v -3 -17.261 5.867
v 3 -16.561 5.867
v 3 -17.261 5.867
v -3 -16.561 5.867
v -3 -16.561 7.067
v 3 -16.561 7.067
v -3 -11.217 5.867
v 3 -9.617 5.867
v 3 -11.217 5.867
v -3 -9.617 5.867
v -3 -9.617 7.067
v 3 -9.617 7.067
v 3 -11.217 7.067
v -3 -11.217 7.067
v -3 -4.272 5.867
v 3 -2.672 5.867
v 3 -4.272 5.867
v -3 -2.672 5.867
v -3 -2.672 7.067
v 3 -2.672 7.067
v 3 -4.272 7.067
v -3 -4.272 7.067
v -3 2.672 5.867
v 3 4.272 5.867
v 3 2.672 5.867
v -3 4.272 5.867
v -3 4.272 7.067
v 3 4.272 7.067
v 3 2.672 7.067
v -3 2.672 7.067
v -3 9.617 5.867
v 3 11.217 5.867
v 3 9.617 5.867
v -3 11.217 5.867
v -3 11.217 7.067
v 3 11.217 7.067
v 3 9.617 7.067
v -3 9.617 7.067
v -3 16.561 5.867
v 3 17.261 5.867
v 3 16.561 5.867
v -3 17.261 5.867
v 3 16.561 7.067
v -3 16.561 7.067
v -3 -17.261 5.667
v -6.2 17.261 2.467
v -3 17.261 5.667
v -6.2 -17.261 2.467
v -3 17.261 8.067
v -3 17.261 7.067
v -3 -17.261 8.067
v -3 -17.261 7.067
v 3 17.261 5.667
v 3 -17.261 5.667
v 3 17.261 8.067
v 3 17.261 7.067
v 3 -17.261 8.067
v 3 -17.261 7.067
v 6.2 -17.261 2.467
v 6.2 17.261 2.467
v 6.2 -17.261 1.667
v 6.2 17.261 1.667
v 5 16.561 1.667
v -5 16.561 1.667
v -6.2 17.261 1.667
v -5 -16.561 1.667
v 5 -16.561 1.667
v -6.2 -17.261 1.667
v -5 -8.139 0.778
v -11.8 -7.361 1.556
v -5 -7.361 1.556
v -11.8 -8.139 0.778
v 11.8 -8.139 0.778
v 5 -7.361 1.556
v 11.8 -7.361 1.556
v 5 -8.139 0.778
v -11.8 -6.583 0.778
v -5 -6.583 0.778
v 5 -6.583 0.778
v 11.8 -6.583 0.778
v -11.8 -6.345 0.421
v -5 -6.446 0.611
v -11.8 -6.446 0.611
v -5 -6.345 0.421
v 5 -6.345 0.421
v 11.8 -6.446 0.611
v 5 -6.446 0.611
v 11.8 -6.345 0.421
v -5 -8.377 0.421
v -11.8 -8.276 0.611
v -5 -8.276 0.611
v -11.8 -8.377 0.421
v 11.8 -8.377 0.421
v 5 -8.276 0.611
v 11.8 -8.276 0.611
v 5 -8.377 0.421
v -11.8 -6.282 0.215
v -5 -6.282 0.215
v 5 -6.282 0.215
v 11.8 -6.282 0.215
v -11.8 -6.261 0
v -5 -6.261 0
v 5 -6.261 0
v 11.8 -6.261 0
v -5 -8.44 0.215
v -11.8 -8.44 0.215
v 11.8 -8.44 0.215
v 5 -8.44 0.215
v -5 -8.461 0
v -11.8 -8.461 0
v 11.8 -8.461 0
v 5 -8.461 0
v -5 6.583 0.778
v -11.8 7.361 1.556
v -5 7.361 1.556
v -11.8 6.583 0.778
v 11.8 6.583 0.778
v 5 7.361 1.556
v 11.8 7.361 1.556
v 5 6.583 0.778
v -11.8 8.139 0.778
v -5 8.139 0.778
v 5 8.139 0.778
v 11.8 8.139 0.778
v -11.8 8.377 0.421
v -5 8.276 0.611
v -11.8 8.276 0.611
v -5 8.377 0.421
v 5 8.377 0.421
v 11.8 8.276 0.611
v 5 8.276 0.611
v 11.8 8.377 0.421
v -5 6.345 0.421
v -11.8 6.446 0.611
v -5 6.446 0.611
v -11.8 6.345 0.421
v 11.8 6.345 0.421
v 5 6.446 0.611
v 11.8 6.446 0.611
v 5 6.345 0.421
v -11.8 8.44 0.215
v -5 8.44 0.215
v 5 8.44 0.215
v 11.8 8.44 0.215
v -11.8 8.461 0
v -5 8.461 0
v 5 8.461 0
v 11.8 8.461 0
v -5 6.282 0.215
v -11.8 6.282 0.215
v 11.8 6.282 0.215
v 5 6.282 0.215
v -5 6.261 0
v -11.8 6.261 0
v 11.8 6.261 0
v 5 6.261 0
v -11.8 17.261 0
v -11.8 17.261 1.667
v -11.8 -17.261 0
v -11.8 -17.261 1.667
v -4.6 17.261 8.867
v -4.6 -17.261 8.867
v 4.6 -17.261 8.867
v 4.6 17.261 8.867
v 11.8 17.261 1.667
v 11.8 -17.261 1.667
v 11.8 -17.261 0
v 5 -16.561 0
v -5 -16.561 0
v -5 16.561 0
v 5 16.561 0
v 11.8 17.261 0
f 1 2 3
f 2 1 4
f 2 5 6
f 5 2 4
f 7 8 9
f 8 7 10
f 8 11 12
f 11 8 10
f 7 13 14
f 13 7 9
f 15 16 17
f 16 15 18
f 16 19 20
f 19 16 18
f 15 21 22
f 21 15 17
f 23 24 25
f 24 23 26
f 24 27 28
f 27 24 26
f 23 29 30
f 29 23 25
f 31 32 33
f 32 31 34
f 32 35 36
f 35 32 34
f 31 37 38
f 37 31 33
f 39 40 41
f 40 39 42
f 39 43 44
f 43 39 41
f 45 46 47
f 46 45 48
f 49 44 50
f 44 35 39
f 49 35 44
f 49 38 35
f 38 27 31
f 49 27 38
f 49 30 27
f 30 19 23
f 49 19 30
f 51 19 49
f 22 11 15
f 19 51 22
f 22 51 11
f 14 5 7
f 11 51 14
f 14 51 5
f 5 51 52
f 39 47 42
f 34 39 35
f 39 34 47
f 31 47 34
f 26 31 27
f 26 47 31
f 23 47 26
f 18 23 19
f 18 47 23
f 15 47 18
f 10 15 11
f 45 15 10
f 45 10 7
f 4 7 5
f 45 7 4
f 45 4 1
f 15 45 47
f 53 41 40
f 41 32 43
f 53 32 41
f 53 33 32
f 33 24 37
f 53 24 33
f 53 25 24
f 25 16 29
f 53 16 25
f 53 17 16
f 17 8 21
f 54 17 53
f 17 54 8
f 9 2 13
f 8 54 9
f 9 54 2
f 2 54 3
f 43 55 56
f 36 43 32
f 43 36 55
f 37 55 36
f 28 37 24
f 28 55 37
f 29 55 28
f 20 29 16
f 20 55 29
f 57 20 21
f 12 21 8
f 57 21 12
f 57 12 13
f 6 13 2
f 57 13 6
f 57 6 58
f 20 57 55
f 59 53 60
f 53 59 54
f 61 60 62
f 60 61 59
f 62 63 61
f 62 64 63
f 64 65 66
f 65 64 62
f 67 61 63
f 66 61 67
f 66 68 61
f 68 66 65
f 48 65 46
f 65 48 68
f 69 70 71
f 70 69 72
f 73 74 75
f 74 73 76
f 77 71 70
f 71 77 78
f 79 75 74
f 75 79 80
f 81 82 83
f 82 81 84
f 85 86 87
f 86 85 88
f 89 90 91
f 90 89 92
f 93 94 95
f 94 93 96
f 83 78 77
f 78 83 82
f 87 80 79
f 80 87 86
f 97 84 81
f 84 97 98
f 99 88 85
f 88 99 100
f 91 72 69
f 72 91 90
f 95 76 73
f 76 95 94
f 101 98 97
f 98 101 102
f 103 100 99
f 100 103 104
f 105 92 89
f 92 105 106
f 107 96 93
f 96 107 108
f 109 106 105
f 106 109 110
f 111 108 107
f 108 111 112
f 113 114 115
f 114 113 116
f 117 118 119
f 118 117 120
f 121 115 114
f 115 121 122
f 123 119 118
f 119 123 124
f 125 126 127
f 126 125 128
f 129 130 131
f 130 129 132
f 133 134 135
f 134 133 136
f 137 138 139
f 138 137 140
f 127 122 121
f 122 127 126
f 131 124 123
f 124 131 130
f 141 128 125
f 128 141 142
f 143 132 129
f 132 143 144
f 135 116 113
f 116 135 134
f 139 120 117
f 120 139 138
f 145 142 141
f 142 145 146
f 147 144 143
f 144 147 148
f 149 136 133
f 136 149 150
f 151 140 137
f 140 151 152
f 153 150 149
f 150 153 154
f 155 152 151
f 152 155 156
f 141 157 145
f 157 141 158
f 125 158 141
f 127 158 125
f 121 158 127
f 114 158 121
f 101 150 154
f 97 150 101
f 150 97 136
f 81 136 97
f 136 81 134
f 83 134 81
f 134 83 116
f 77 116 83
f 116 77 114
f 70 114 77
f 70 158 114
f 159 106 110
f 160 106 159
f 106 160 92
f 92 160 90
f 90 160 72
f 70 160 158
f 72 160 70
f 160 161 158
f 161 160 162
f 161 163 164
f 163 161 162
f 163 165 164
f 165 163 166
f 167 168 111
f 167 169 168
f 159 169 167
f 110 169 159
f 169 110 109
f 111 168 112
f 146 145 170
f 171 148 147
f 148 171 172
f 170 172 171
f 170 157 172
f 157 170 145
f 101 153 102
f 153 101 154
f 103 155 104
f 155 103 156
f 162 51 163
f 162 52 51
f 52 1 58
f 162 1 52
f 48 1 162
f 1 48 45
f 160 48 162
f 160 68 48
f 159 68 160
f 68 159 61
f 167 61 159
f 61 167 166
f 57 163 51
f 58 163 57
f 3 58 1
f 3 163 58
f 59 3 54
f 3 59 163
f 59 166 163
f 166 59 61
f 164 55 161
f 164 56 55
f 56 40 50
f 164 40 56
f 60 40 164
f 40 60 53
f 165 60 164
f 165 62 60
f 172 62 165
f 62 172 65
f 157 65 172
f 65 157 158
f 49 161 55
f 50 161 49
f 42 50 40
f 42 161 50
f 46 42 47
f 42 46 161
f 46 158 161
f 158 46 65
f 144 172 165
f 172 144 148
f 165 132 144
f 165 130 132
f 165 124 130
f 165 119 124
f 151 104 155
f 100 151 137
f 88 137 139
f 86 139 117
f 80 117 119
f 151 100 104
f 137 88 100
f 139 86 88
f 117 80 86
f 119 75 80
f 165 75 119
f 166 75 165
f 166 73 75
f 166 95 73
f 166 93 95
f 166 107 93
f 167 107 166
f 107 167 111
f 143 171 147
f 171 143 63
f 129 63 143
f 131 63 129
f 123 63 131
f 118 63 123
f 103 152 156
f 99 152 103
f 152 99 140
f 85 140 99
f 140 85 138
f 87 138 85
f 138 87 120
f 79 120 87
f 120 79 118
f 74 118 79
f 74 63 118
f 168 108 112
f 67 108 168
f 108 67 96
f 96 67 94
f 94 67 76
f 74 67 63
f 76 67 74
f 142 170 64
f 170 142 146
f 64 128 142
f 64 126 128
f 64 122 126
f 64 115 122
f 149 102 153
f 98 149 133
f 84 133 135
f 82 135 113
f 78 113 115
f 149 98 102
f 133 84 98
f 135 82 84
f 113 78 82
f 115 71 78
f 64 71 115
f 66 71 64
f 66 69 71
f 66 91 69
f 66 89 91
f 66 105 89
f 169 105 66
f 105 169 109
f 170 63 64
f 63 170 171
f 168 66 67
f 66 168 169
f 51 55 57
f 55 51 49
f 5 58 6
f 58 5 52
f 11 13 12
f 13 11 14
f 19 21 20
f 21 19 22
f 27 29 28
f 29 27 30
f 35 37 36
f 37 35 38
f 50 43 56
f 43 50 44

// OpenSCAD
/*[Main]*/
part="test_channel";//[test_channel:test channel,test_joiner:test joiner,cap:cap,mount:mount,info:info,channel:channel,joiner_mid:joiner mid,joiner_end:joiner end,joiner_corner:corner,joiner_spur:spur]
//asembly tolerance
channel_tol=0.2;//[0:0.05:1]
//extrusion width
ew=0.4;//[0:0.01:1.5]

/*[Strip Properties]*/
//half of max width of strips to be used.
max_half_strip_w=6;//[1.5:0.1:12.5]
//thickness of strip including the parts on its surface and add little more for slack.
strip_t=3.4;//[1:0.1:10]
//width of strip
strip_w=12;//[3:0.1:25]
//thickness of just the pcb of the strip (excludes the parts on top). make larger than pcb thickness if theres unused double stick on back.
pcb_t=0.8;//[0.2:0.2:2]
//number of leds per meter. usually 144, 60, or 30
leds_per_m=144;//[20:1:250]

/*[Design Dimensions]*/
//LEDs per channel. should be some multiple of LEDs in your strip.
leds_per_seg=36;//[2:1:250]
//shortens one end of channel and joiner by some leds. effects: channel, joiner mid, joiner end
short=0;//[0:1:25]
//size for locking pin holes
pin_hole=2.2;//[1:0.01:3]
//estimate of joiner thickness. larger is stronger but heavier.
outer_sleve_t=2;//[1:0.2:6]

/*[Mount]*/
//Thickness
bracket_t=2;//[1:0.1:3]
//Width
bracket_w=20;//[10:1:50]
//Diameter of screw head
screw_head_d=6.5;//[1:0.1:15]
//Depth of countersink
screw_head_h=1.5;//[0.5:0.1:5]
//Screw hole diameter
screw_hole_d=3;//[1:0.1:5]
//clipping strength
mount_clip=1;//[0.4:0.1:1.6]
//pan/countersink
screw_head_shp=0;//[0:countersink,1:pan]

/*[Corners and Spurs]*/
//angle for corner
corner_angle=90;//[0:180]
//spur max sides
spur_sides_max=4;//[3:1:8]
//consecutive spur sides used
spur_sides=3;//[3:1:8]

/*[Wiring]*/
//diameter of power wires
power_d=2;//[1:0.2:5.6]
//diameter of signal wire
sig_d=2;//[0.4:0.2:3]
//wire spacing
wire_space=3;//[1:0.1:5]

/*[Diffusion Properties]*/
//diffusion distance
dist=3;//[1:0.2:15]
//diffusion thickness
diff_t=0.8;//[0.6:0.2:2]
//gap between top of baffle and diffuser to let a little out. smooths the look
baffle_bleed=1;//[0:0.2:15.2]

/*[Hidden]*/
//controlls how many sides the arcs of corners etc. have
a_step=360/36;
//some calculations...
//keeps LEDs aligned
channel_gap=channel_tol;
//makes top bridging easier
top_expand=ew*4;
//thickness of baffles. should be 4x extrusion width
baffle_t=4*ew;
//thickness of the bottom of the channel
bottom=pin_hole/1.5+0.2;
//in case you goofed. should be an integer result

//LED spacing
mm_per_led=1000/leds_per_m;
//length of channel
seg_len=leds_per_seg*mm_per_led;

joiner_ow=2*(strip_t+dist+diff_t)+max_half_strip_w+2*top_expand+(outer_sleve_t)*3;

channel_w=2*(strip_t+dist+diff_t)+max_half_strip_w+2*top_expand;

joinner_iw=channel_w+channel_tol;

joiner_oh=bottom+strip_t+dist+diff_t+(outer_sleve_t)*1.5;
//length to cut pin hole in joiners
joiner_pin_l=joiner_ow+2;
//length to cut pin hole in channels. actually more like a notch.
channel_pin_l=2*(strip_t+dist+diff_t)+max_half_strip_w+2*top_expand+2;
//because of multiple wires at a certain spacing. make equal to strip_w in case strip hangs out.
wire_hole_l=strip_w;
//length for test
leds_per_test=5;
test_len=mm_per_led*leds_per_test;
//pin holes space
pin_hole_space=20;
//maximum shorten
max_short=floor(leds_per_seg/2-pin_hole_space*3/mm_per_led);
short_final=min(short,max_short);
//parts:


if(part=="info")info();
if(part=="channel")translate([0,-seg_len/2,0])channel();
if(part=="test_channel")translate([0,-test_len/2,0])test_channel();
if(part=="test_joiner")translate([0,-test_len/2,0])translate([0,test_len/2,outer_sleve_t+channel_tol+pcb_t/2+power_d-pin_hole/2])test_joiner();
if(part=="cap")translate([0,0,outer_sleve_t+channel_tol+pcb_t/2+power_d])cap_w_hole();
if(part=="joiner_mid")translate([0,0,outer_sleve_t+channel_tol+pcb_t/2+power_d])joiner_mid();
if(part=="joiner_end")translate([0,-seg_len/4-mm_per_led,outer_sleve_t+channel_tol+pcb_t/2+power_d])joiner_end();
if(part=="joiner_corner")translate([mm_per_led/2-joiner_ow/2,mm_per_led/2-joiner_ow/2,outer_sleve_t+channel_tol+pcb_t/2+power_d-pin_hole/2])joiner_corner();
if(part=="joiner_spur")translate([0,0,outer_sleve_t+channel_tol+pcb_t/2+power_d-pin_hole/2])joiner_spur();
if(part=="mount")mount();

module mount_hole(l)
{
    /*hull()
    {
        translate([-(joiner_ow+channel_tol)/2,-l/2,-channel_tol])cube([joiner_ow+channel_tol,l,outer_sleve_t+bottom+channel_tol*5+power_d]);
        translate([-(joiner_ow+channel_tol)/6,-l/2,-channel_tol/2])cube([(joiner_ow+channel_tol)/3,l,(outer_sleve_t+bottom+channel_tol*5+power_d)+(joiner_ow+channel_tol)/3]);
    }*/
    union()
    {
        translate([0,-l/2,joiner_oh/2-channel_tol/2+(strip_t+dist)/2])rotate([-90,0,0])channel_hole(l,0,channel_tol+outer_sleve_t);
        translate([-joiner_ow/2-channel_tol*1.5,-l/2,joiner_oh/2-channel_tol*2-outer_sleve_t-channel_tol-pcb_t/2-power_d])cube([joiner_ow+channel_tol*3,l,power_d+1]);
    }
}
module mount()
{
    difference()
    {
        minkowski()
        {
            union()
            {
                mount_hole(bracket_w-bracket_t*2);
                translate([-(channel_tol*3+joiner_ow)/2,-(bracket_w-bracket_t*2)/2,-channel_tol-bracket_t/2])cube([channel_tol*3+joiner_ow,bracket_w-bracket_t*2,outer_sleve_t+channel_tol*2]);
            }
            sphere(r=bracket_t,$fn=6);           
        }
        mount_hole(bracket_w*2);
        translate([-(joiner_ow+bracket_t*2+channel_tol*4)/2,-(bracket_w+2)/2,(outer_sleve_t+bottom+channel_tol*5+power_d)+mount_clip])cube([joiner_ow+bracket_t*2+channel_tol*4,bracket_w+2,joiner_oh]);
            //screw hole
        translate([0,0,bracket_t/2])rotate([180,0,0]){
            cylinder(d1=screw_head_d,d2=screw_head_shp?screw_head_d:screw_hole_d,h=screw_head_h,$fn=30);
            cylinder(d=screw_hole_d,h=2.5*bracket_t,$fn=30);
        }
            //slots
            translate([joiner_ow/3,0,bracket_t/2])rotate([0,45,0])cube([(channel_tol+2*bracket_t-1)*sqrt(2),bracket_w+2,(channel_tol+2*bracket_t-1)*sqrt(2)],center=true);
            translate([-joiner_ow/3,0,bracket_t/2])rotate([0,45,0])cube([(channel_tol+2*bracket_t-1)*sqrt(2),bracket_w+2,(channel_tol+2*bracket_t-1)*sqrt(2)],center=true);
    }
}

module info()
{
    linear_extrude(1)text(str("Total width ",joiner_ow,"mm"));
    translate([0,-10,0])text(str("Normal segment length ",seg_len,"mm"));
    translate([0,-20,0])linear_extrude(1)text(str("Shortened by ",short_final," LEDs (",(short_final*mm_per_led),"mm)"));
    translate([0,-30,0])text(str("Shortened (actual) segment length ",(seg_len-short_final*mm_per_led),"mm"));
}

module test_joiner()
{
    difference()
    {
        union()
        {
            translate([0,channel_gap/2-test_len/2,(strip_t+dist)/2+pin_hole/2])rotate([-90,0,0])difference()
            {
                channel_hole(test_len-channel_gap,0,outer_sleve_t);
                translate([0,0,-1])channel_hole(test_len+2-channel_gap,outer_sleve_t,channel_tol);        
            }
             //for wire holes   
            translate([-joiner_ow/2,-test_len/2+channel_gap/2,-outer_sleve_t-channel_tol-pcb_t/2-power_d+pin_hole/2])cube([joiner_ow,test_len-channel_gap,power_d+1]);
        }
        //pin holes
        //ends
        translate([0,test_len/2-pin_hole_space/2,0])pin_hole(joiner_pin_l);
        translate([0,-test_len/2+pin_hole_space/2,0])pin_hole(joiner_pin_l);
        //wire holes
        translate([0,0,-outer_sleve_t-channel_tol*2-pcb_t-power_d+pin_hole/2])all_wire_holes(l=test_len-channel_gap+2);
        //tap holes
        translate([0,test_len/2,-outer_sleve_t-channel_tol-pcb_t/2-power_d+pin_hole])hull()
        {
            cube([wire_space*2+power_d+channel_tol,wire_space*2+power_d+channel_tol,power_d*2+outer_sleve_t*2+2],center=true);
            translate([0,0,-0.5])cube([wire_space*2+power_d+channel_tol,(wire_space*2+power_d+channel_tol)*2,1],center=true);
        }
        translate([0,-test_len/2,-outer_sleve_t-channel_tol-pcb_t/2-power_d+pin_hole])hull()
        {
            cube([wire_space*2+power_d+channel_tol,wire_space*2+power_d+channel_tol,power_d*2+outer_sleve_t*2+2],center=true);
            translate([0,0,-0.5])cube([wire_space*2+power_d+channel_tol,(wire_space*2+power_d+channel_tol)*2,1],center=true);
        }
    }
}

module test_channel()
{
    difference()
    {
        //base
        hull()
        {
            translate([-max_half_strip_w/2-top_expand,channel_gap/2,0])cube([max_half_strip_w+2*top_expand,test_len-channel_gap,bottom+strip_t+dist+diff_t]);
            translate([-strip_t-dist-diff_t-max_half_strip_w/2-top_expand,channel_tol/2,0])cube([2*(strip_t+dist+diff_t)+max_half_strip_w+2*top_expand,test_len-channel_gap,bottom]);        
        }
        //cut out
        p=[[-strip_w/2-channel_tol,0],[-strip_w/2-channel_tol,pcb_t],[-max_half_strip_w/2,(strip_w+2*channel_tol-max_half_strip_w)/2+pcb_t],[-max_half_strip_w/2,strip_t+dist],
        [max_half_strip_w/2,strip_t+dist],[max_half_strip_w/2,(strip_w+2*channel_tol-max_half_strip_w)/2+pcb_t],[strip_w/2+channel_tol,pcb_t],[strip_w/2+channel_tol,0]];
        difference()
        {
            translate([0,-1,bottom])rotate([90,0,180])linear_extrude(test_len+2)polygon(points=p);
            //baffles
            for(i=[0:leds_per_test])translate([0,mm_per_led*i,dist/2+bottom+strip_t+diff_t])cube([max_half_strip_w+2,baffle_t,dist],center=true);
        }
        //botom cut
        translate([-(strip_w-2)/2,baffle_t/2,-1])cube([strip_w-2,test_len-baffle_t,bottom+2]);
        //baffle bleed
        translate([-max_half_strip_w/2,-1,bottom+strip_t+dist-baffle_bleed])cube([max_half_strip_w,test_len+2,baffle_bleed]);
        //pin holes
        translate([0,pin_hole_space/2,0])pin_hole(joiner_pin_l);
        translate([0,test_len-pin_hole_space/2,0])pin_hole(joiner_pin_l);
    }
}
module channel()
{
    difference()
    {
        //base
        hull()
        {
            translate([-max_half_strip_w/2-top_expand,channel_gap/2,0])cube([max_half_strip_w+2*top_expand,seg_len-short_final*mm_per_led-channel_gap,bottom+strip_t+dist+diff_t]);
            translate([-strip_t-dist-diff_t-max_half_strip_w/2-top_expand,channel_tol/2,0])cube([2*(strip_t+dist+diff_t)+max_half_strip_w+2*top_expand,seg_len-short_final*mm_per_led-channel_gap,bottom]);        
        }
        //cut out
        p=[[-strip_w/2-channel_tol,0],[-strip_w/2-channel_tol,pcb_t],[-max_half_strip_w/2,(strip_w+2*channel_tol-max_half_strip_w)/2+pcb_t],[-max_half_strip_w/2,strip_t+dist],
        [max_half_strip_w/2,strip_t+dist],[max_half_strip_w/2,(strip_w+2*channel_tol-max_half_strip_w)/2+pcb_t],[strip_w/2+channel_tol,pcb_t],[strip_w/2+channel_tol,0]];
        difference()
        {
            translate([0,-1,bottom])rotate([90,0,180])linear_extrude(seg_len-short_final*mm_per_led+2)polygon(points=p);
            //baffles
            for(i=[0:leds_per_seg-short_final])translate([0,mm_per_led*i,dist/2+bottom+strip_t+diff_t])cube([max_half_strip_w+2,baffle_t,dist],center=true);
        }
        //botom cut
        translate([-(strip_w-2)/2,baffle_t/2,-1])cube([strip_w-2,seg_len-short_final*mm_per_led-baffle_t,bottom+2]);
        //baffle bleed
        translate([-max_half_strip_w/2,-1,bottom+strip_t+dist-baffle_bleed])cube([max_half_strip_w,seg_len-short_final*mm_per_led+2,baffle_bleed]);
        //pin holes
        //ends
        translate([0,pin_hole_space/2,0])pin_hole(joiner_pin_l);
        translate([0,pin_hole_space*1.5,0])pin_hole(joiner_pin_l);
        translate([0,seg_len-short_final*mm_per_led-pin_hole_space/2,0])pin_hole(joiner_pin_l);
        translate([0,seg_len-short_final*mm_per_led-pin_hole_space*1.5,0])pin_hole(joiner_pin_l);
        //mid
        translate([0,seg_len/2+pin_hole_space/2,0])pin_hole(joiner_pin_l);
        translate([0,seg_len/2-pin_hole_space/2,0])pin_hole(joiner_pin_l);
    }
}

module joiner_mid()
{
    difference()
    {
        union()
        {
            translate([0,channel_gap/2-seg_len/2,(strip_t+dist)/2+pin_hole/2])rotate([-90,0,0])difference()
            {
                channel_hole(seg_len-channel_gap-short_final*mm_per_led,0,outer_sleve_t);
                translate([0,0,-1])channel_hole(seg_len-short_final*mm_per_led+2-channel_gap,outer_sleve_t,channel_tol);        
            }
             //for wire holes   
            translate([-joiner_ow/2,-seg_len/2+channel_gap/2,-outer_sleve_t-channel_tol-pcb_t/2-power_d+pin_hole/2])cube([joiner_ow,seg_len-channel_gap-short_final*mm_per_led,power_d+1]);
        }
        //pin holes
        //mid
        translate([0,pin_hole_space/2,0])pin_hole(joiner_pin_l);
        translate([0,-pin_hole_space/2,0])pin_hole(joiner_pin_l);
        //ends
        translate([0,seg_len/2-pin_hole_space/2-short_final*mm_per_led,0])pin_hole(joiner_pin_l);
        translate([0,-seg_len/2+pin_hole_space/2,0])pin_hole(joiner_pin_l);
        //wire holes
        translate([0,0,-outer_sleve_t-channel_tol*2-pcb_t/2-power_d+pin_hole/2])all_wire_holes(l=seg_len-channel_gap-short_final*mm_per_led+2);
        //tap holes
        translate([0,seg_len/2-short_final*mm_per_led,-outer_sleve_t-channel_tol-pcb_t/2-power_d+pin_hole/2])hull()
        {
            cube([wire_space*2+power_d+channel_tol,wire_space*2+power_d+channel_tol,power_d*2+outer_sleve_t*2+2],center=true);
            translate([0,0,-0.5])cube([wire_space*2+power_d+channel_tol,(wire_space*2+power_d+channel_tol)*2,1],center=true);
        }
        translate([0,-seg_len/2,-outer_sleve_t-channel_tol-pcb_t/2-power_d+pin_hole/2])hull()
        {
            cube([wire_space*2+power_d+channel_tol,wire_space*2+power_d+channel_tol,power_d*2+outer_sleve_t*2+2],center=true);
            translate([0,0,-0.5])cube([wire_space*2+power_d+channel_tol,(wire_space*2+power_d+channel_tol)*2,1],center=true);
        }
    }
}
module joiner_end()
{
    difference()
    {
        union()
        {
            translate([0,channel_gap/2+pin_hole_space,(strip_t+dist)/2+pin_hole/2])rotate([-90,0,0])difference()
            {
                channel_hole(seg_len/2-short_final*mm_per_led-pin_hole_space-channel_gap,0,outer_sleve_t);
                translate([0,0,-1])channel_hole(seg_len/2-short_final*mm_per_led-pin_hole_space-channel_gap+2,outer_sleve_t,channel_tol);    
            }
            //for wire holes
            translate([-joiner_ow/2,channel_gap/2+pin_hole_space,-outer_sleve_t-channel_tol-pcb_t/2-power_d+pin_hole/2])cube([joiner_ow,seg_len/2-pin_hole_space-channel_gap-short_final*mm_per_led,power_d+1]);
        }
        //pin holes
        //ends
        translate([0,pin_hole_space*1.5,0])pin_hole(joiner_pin_l);
        translate([0,seg_len/2-pin_hole_space/2-short_final*mm_per_led,0])pin_hole(joiner_pin_l);
        //wire holes
        translate([0,0,-outer_sleve_t-channel_tol*2-pcb_t/2-power_d+pin_hole/2])all_wire_holes(l=seg_len-channel_gap+2);
        //tap holes
        translate([0,seg_len/2-short_final*mm_per_led,-outer_sleve_t-channel_tol-pcb_t/2-power_d+pin_hole/2])hull()
        {
            cube([wire_space*2+power_d+channel_tol,wire_space*2+power_d+channel_tol,power_d*2+outer_sleve_t*2+2],center=true);
            translate([0,0,-0.5])cube([wire_space*2+power_d+channel_tol,(wire_space*2+power_d+channel_tol)*2,1],center=true);
        }
        translate([0,pin_hole_space,-outer_sleve_t-channel_tol-pcb_t/2-power_d+pin_hole/2])hull()
        {
            cube([wire_space*2+power_d+channel_tol,wire_space*2+power_d+channel_tol,power_d*2+outer_sleve_t*2+2],center=true);
            translate([0,0,-0.5])cube([wire_space*2+power_d+channel_tol,(wire_space*2+power_d+channel_tol)*2,1],center=true);
        }
  }
}
module cap_w_hole()
{
    difference()
    {
        union()
        {
            cap();
            translate([-joiner_ow/2,-pin_hole_space/2-2,-outer_sleve_t-channel_tol-pcb_t/2-power_d+pin_hole/2])cube([joiner_ow,pin_hole_space-channel_gap/2+2,power_d+1]);
        }
        translate([0,-1,-bottom/2-power_d/2])cube([wire_space*2+power_d,4+pin_hole_space,bottom+outer_sleve_t+power_d+1+dist+bottom+strip_t],center=true);
        //pin hole
        pin_hole(joiner_pin_l);
    }
}
//an adjustable corner
module joiner_corner(a=corner_angle)
{
    union()
    {
        difference()
        {
            corner_arc_out(a);
            corner_arc_in(a);
        }
        translate([joiner_ow/2,0,0])corner_joiner_piece();
        rotate([0,0,a])mirror([0,1,0])translate([joiner_ow/2,0,0])corner_joiner_piece();
    }
}
module joiner_spur()
{
    sa=360/spur_sides_max;
    r=joiner_ow/(2*tan(180/spur_sides_max));
    spur_sides2=min(spur_sides,spur_sides_max);
    difference()
    {
       for(i=[0:1:spur_sides2-2+((spur_sides_max==spur_sides2)?1:0)])rotate([0,0,360/spur_sides_max*i])
            translate([r,joiner_ow/2,0])
        rotate([0,0,90])mirror([1,0,0])corner_arc_out(180-sa);
       for(i=[0:1:spur_sides2-2+((spur_sides_max==spur_sides2)?1:0)])rotate([0,0,360/spur_sides_max*i])
            translate([r,joiner_ow/2,0])
        rotate([0,0,90])mirror([1,0,0])corner_arc_in(180-sa);
    }
    for(i=[0:1:spur_sides2-1])rotate([0,0,360/spur_sides_max*i])
            translate([r,0,0])rotate([0,0,90])corner_joiner_piece();
}

//helpers
//translate([0,0,4.4])test_channel();
//joiner hole/joiner exterior
module channel_hole(l,notch,tol)
{
    translate([0,(bottom+strip_t+pcb_t+dist+tol)/2,0])rotate([90,0,0])union()
    {
        hull()
        {
            translate([-max_half_strip_w/2-top_expand-tol/2,0,top_expand/4])cube([max_half_strip_w+2*top_expand+tol,l,bottom+strip_t+dist+diff_t+tol*1.5]);
            translate([-strip_t-dist-diff_t-max_half_strip_w/2-top_expand-tol*1.5,0,0])cube([2*(strip_t+dist+diff_t)+max_half_strip_w+2*top_expand+tol*3,l,bottom+pcb_t/2+tol/2]);        
        }
        if(notch*1.5>tol)translate([0,0,-tol])hull()
        {
            translate([-(max_half_strip_w+top_expand*2+tol),0,bottom+strip_t+dist+tol+diff_t/2+top_expand/2+0.01+(((max_half_strip_w+2*top_expand+tol)*2)-(max_half_strip_w+2*top_expand+tol))/2])cube([(max_half_strip_w+2*top_expand+tol)*2,l,0.01]);
        translate([-max_half_strip_w/2-top_expand-tol/2,0,bottom+strip_t+dist+tol*3+top_expand/2])cube([max_half_strip_w+2*top_expand+tol,l,0.01]);
        }
    }
}
//plain cap
module cap()
{
    difference()
    {
        translate([0,-pin_hole_space/2-2,(strip_t+dist)/2+pin_hole/2])rotate([-90,0,0])difference()
        {
            channel_hole(pin_hole_space+2-channel_gap/2,0,outer_sleve_t);
            translate([0,0,2])channel_hole(pin_hole_space+2-channel_gap,outer_sleve_t,channel_tol);    
        }
    }
}
//arcs for corners
module corner_arc_in(a)
{
    for(i=[0:a_step:a])rotate([0,0,i])union()
    {
        hull()
        {
            translate([joiner_ow/2,-1.05,(strip_t+dist)/2+pin_hole/2])rotate([-90,0,0])channel_hole(2.1,0,channel_tol/3);
            rotate([0,0,a_step])translate([joiner_ow/2,-1.05,(strip_t+dist)/2+pin_hole/2])rotate([-90,0,0])channel_hole(2.1,0,channel_tol/3);
        }
        hull()
        {
            translate([joiner_ow/2,0,-(strip_t+dist)/2+pin_hole/2])cube([joinner_iw,2.1,strip_t+dist+pin_hole-channel_tol],center=true);
            rotate([0,0,a_step])translate([joiner_ow/2,0,-(strip_t+dist)/2+pin_hole/2])cube([joinner_iw,2.1,strip_t+dist+pin_hole-channel_tol],center=true);
        }
    }
}

module corner_arc_out(a)
{
    difference()
    {
        for(i=[0:a_step:a])rotate([0,0,i])union()
        {
            hull()
            {
                translate([joiner_ow/2,-0.05,(strip_t+dist)/2+pin_hole/2])rotate([-90,0,0])channel_hole(0.1,0,outer_sleve_t);
                rotate([0,0,a_step])translate([joiner_ow/2,-0.05,(strip_t+dist)/2+pin_hole/2])rotate([-90,0,0])channel_hole(0.1,0,outer_sleve_t);
            }
            hull()
            {
                translate([0,-0.05,-outer_sleve_t-channel_tol-pcb_t/2-power_d+pin_hole/2])cube([joiner_ow,0.1,power_d+1]);
                rotate([0,0,a_step])translate([0,-0.05,-outer_sleve_t-channel_tol-pcb_t/2-power_d+pin_hole/2])cube([joiner_ow,0.1,power_d+1]);
            }
        }
        mirror([0,1,0])translate([-1,0,-(strip_t+dist)/2-power_d+pin_hole/2])cube([joiner_ow+2,sin(a_step)*joiner_ow,joiner_oh+power_d+2]);
        rotate([0,0,a])translate([-1,0,-(strip_t+dist)/2-power_d+pin_hole/2])cube([joiner_ow+2,sin(a_step)*joiner_ow,joiner_oh+power_d+2]);
    }
}

//leg of corners
module corner_joiner_piece()
{
    difference()
        {
            union()
            {
            translate([0,channel_gap/2-pin_hole_space,(strip_t+dist)/2+pin_hole/2])rotate([-90,0,0])difference()
            {
                channel_hole(pin_hole_space-channel_gap/2+0.1,0,outer_sleve_t);
                translate([0,0,-1])channel_hole(pin_hole_space+2-channel_gap/2+0.1,outer_sleve_t,channel_tol);    
            }
            //for wire holes
            translate([-joiner_ow/2,-(pin_hole_space-channel_gap/2),-outer_sleve_t-channel_tol-pcb_t/2-power_d+pin_hole/2])cube([joiner_ow,pin_hole_space-channel_gap/2,power_d+1]);
        }
            //pin holes
            //ends
            translate([0,-pin_hole_space/2,0])pin_hole(joiner_pin_l);
            //translate([0,-mm_per_led*(leds_per_seg/2-1),0])pin_hole(joiner_pin_l);
            //wire holes
            translate([0,0,-outer_sleve_t-channel_tol*2-pcb_t/2-power_d+pin_hole/2])all_wire_holes(l=seg_len-channel_gap+2);
        //tap hole
        translate([0,0,-power_d-outer_sleve_t-1+pin_hole/2])hull()
        {
            cube([wire_space*2+power_d+channel_tol,wire_space*2+power_d+channel_tol,power_d*2+outer_sleve_t*2+2],center=true);
            translate([0,0,-0.5])cube([wire_space*2+power_d+channel_tol,(wire_space*2+power_d+channel_tol)*2,1],center=true);
        }
        }
}
//holes for pins
module pin_hole(l,d=pin_hole)
{
    rotate([45,0,0])translate([-l/2,0,0])cube([l,d/2,d/2]);
    rotate([0,90,0])cylinder(d=d,h=l,$fn=32,center=true);
}
module all_wire_holes(l)
{
    translate([0,0,sig_d/2])wire_hole(l,d=sig_d);
    translate([-wire_space,0,power_d/2])wire_hole(l,power_d);
    translate([wire_space,0,power_d/2])wire_hole(l,power_d);
}
//holes for wires
module wire_hole(l,d)
{
    rotate([0,-45,0])translate([0,-l/2,0])cube([(d+channel_tol)/2,l,(d+channel_tol)/2]);
    rotate([90,0,0])cylinder(d=(d+channel_tol),h=l,$fn=32,center=true);
    translate([0,0,-(d+channel_tol)/2])cube([(d+channel_tol)*0.97,l,(d+channel_tol)],center=true);
}
